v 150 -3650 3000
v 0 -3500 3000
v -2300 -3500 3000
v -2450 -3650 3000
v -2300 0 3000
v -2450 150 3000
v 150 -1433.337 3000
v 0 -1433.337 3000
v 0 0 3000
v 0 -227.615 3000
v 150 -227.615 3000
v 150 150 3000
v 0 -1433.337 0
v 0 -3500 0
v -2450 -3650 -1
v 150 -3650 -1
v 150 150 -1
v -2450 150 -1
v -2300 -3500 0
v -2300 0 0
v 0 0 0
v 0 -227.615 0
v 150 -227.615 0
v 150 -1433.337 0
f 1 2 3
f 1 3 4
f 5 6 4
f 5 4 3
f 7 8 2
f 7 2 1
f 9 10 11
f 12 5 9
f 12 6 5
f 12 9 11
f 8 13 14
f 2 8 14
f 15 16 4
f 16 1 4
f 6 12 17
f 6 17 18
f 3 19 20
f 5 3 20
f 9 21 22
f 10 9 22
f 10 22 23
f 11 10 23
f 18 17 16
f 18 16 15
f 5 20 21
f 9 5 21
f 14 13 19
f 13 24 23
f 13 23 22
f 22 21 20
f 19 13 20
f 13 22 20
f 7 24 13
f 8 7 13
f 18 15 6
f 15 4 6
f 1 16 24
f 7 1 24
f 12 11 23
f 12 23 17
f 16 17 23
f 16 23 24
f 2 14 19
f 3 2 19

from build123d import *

# Parameters (mm, degrees)
BOSS_EXTRUDE1_DEPTH = 3000
SKETCH2_W           = 2600
SKETCH2_H           = 3800
BOSS_EXTRUDE2_DEPTH = 1


with BuildPart() as part:
    # Sketch1 → Boss-Extrude1 (new body)
    with BuildSketch(Plane.XY):
        Polygon((0, -227.614779849), (150, -227.614779849), (150, 150), (-2450, 150), (-2450, -3650), (150, -3650), (150, -1433.336510226), (0, -1433.336510226), (0, -3500), (-2300, -3500), (-2300, 0), (0, 0), align=None)
    extrude(amount=BOSS_EXTRUDE1_DEPTH)

    # Sketch2 → Boss-Extrude2 (add)
    with BuildSketch(Plane(origin=(0, 0, 0), x_dir=(-1, 0, 0), z_dir=(0, 0, -1))):
        with Locations((1150, -1750)):
            Rectangle(SKETCH2_W, SKETCH2_H)
    extrude(amount=BOSS_EXTRUDE2_DEPTH)


solid = part.part
